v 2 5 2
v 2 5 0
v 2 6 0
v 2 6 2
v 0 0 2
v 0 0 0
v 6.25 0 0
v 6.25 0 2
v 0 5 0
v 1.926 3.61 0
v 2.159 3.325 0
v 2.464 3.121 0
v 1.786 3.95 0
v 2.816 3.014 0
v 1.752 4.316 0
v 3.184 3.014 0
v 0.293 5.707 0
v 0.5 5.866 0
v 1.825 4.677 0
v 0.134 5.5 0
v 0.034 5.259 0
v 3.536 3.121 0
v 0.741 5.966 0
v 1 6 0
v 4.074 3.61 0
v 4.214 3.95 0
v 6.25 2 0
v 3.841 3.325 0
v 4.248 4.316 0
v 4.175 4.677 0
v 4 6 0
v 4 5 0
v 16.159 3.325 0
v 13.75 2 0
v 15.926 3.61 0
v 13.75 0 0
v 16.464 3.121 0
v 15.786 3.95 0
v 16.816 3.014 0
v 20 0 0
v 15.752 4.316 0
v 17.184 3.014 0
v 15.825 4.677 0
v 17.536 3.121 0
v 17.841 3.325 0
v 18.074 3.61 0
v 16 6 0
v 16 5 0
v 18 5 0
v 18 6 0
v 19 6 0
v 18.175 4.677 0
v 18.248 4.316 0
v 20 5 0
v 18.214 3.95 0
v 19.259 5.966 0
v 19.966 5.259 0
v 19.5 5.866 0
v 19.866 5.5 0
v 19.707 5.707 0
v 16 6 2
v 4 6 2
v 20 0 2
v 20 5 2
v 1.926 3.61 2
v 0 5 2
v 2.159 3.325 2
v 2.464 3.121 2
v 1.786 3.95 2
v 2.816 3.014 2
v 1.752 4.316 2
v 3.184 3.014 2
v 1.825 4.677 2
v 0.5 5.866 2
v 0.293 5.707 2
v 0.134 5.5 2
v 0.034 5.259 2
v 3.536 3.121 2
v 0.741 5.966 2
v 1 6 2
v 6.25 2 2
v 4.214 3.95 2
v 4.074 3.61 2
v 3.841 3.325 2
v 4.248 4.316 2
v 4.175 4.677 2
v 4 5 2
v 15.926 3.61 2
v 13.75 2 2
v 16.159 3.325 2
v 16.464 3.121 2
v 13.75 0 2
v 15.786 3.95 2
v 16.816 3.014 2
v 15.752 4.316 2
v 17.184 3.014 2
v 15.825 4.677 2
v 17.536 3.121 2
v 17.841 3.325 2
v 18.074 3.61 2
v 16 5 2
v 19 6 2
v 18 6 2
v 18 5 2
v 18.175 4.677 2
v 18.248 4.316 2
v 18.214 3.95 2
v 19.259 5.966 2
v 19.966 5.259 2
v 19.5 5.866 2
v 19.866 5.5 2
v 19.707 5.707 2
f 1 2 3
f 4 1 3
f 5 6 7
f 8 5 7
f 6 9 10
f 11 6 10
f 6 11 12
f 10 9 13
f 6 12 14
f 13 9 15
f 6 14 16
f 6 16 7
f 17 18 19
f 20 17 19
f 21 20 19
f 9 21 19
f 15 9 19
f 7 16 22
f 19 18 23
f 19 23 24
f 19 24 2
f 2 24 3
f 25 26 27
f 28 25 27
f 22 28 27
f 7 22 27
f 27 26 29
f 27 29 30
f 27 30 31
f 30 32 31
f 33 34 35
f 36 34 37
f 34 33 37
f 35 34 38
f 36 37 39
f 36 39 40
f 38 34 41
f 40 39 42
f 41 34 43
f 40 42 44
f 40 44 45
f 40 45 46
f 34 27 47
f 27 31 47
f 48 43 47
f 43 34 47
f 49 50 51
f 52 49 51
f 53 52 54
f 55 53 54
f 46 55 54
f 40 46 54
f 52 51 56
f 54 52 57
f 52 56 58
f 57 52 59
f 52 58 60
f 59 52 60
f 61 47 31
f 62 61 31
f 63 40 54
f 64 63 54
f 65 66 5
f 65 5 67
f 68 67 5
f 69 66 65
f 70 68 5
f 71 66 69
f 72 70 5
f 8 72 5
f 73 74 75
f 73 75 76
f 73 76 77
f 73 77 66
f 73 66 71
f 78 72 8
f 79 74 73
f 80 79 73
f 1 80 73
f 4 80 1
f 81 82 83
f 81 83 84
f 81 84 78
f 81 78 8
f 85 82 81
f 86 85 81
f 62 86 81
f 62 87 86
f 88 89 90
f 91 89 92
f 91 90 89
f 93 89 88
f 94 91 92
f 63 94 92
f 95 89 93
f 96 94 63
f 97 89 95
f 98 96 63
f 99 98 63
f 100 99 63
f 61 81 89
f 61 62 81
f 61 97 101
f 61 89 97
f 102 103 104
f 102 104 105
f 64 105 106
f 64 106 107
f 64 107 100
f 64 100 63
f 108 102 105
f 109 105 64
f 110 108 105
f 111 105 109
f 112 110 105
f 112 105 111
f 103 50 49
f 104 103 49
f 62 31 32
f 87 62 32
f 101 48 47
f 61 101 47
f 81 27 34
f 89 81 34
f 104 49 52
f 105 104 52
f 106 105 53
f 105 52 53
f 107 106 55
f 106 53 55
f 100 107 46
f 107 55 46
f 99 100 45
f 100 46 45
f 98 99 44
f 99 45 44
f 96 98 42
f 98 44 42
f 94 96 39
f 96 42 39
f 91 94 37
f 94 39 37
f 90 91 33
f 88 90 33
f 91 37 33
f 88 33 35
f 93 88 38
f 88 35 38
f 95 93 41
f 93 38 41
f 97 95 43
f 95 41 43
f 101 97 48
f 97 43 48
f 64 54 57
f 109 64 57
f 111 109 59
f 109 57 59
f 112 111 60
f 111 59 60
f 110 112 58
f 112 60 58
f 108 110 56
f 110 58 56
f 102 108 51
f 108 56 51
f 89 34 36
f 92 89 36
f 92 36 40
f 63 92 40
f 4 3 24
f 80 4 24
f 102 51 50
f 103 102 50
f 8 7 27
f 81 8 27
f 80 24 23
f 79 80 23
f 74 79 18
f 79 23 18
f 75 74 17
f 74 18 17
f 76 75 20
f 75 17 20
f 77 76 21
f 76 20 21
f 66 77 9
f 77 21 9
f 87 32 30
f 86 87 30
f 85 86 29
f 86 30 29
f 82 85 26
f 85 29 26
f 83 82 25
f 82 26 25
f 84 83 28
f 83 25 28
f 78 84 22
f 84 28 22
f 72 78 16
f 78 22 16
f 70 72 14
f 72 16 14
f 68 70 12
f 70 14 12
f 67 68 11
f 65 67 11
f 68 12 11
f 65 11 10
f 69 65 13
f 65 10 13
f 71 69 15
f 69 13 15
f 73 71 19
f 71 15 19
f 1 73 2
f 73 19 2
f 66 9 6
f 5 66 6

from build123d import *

# Parameters (mm, degrees)
BOSS_EXTRUDE1_DEPTH = 2


with BuildPart() as part:
    # Model → Boss-Extrude1 (new body)
    with BuildSketch(Plane.XY):
        with BuildLine():
            Line((6.25, 2), (13.75, 2))
            Line((13.75, 2), (13.75, 0))
            Line((13.75, 0), (20, 0))
            Line((20, 0), (20, 5))
            ThreePointArc((20, 5), (19.707106781, 5.707106781), (19, 6))
            Line((19, 6), (18, 6))
            Line((18, 6), (18, 5))
            ThreePointArc((18, 5), (17, 3), (16, 5))
            Line((16, 5), (16, 6))
            Line((16, 6), (4, 6))
            Line((4, 6), (4, 5))
            ThreePointArc((4, 5), (3, 3), (2, 5))
            Line((2, 5), (2, 6))
            Line((2, 6), (1, 6))
            ThreePointArc((1, 6), (0.292893219, 5.707106781), (0, 5))
            Line((0, 5), (0, 0))
            Line((0, 0), (6.25, 0))
            Line((6.25, 0), (6.25, 2))
        make_face()
    extrude(amount=BOSS_EXTRUDE1_DEPTH)


solid = part.part
